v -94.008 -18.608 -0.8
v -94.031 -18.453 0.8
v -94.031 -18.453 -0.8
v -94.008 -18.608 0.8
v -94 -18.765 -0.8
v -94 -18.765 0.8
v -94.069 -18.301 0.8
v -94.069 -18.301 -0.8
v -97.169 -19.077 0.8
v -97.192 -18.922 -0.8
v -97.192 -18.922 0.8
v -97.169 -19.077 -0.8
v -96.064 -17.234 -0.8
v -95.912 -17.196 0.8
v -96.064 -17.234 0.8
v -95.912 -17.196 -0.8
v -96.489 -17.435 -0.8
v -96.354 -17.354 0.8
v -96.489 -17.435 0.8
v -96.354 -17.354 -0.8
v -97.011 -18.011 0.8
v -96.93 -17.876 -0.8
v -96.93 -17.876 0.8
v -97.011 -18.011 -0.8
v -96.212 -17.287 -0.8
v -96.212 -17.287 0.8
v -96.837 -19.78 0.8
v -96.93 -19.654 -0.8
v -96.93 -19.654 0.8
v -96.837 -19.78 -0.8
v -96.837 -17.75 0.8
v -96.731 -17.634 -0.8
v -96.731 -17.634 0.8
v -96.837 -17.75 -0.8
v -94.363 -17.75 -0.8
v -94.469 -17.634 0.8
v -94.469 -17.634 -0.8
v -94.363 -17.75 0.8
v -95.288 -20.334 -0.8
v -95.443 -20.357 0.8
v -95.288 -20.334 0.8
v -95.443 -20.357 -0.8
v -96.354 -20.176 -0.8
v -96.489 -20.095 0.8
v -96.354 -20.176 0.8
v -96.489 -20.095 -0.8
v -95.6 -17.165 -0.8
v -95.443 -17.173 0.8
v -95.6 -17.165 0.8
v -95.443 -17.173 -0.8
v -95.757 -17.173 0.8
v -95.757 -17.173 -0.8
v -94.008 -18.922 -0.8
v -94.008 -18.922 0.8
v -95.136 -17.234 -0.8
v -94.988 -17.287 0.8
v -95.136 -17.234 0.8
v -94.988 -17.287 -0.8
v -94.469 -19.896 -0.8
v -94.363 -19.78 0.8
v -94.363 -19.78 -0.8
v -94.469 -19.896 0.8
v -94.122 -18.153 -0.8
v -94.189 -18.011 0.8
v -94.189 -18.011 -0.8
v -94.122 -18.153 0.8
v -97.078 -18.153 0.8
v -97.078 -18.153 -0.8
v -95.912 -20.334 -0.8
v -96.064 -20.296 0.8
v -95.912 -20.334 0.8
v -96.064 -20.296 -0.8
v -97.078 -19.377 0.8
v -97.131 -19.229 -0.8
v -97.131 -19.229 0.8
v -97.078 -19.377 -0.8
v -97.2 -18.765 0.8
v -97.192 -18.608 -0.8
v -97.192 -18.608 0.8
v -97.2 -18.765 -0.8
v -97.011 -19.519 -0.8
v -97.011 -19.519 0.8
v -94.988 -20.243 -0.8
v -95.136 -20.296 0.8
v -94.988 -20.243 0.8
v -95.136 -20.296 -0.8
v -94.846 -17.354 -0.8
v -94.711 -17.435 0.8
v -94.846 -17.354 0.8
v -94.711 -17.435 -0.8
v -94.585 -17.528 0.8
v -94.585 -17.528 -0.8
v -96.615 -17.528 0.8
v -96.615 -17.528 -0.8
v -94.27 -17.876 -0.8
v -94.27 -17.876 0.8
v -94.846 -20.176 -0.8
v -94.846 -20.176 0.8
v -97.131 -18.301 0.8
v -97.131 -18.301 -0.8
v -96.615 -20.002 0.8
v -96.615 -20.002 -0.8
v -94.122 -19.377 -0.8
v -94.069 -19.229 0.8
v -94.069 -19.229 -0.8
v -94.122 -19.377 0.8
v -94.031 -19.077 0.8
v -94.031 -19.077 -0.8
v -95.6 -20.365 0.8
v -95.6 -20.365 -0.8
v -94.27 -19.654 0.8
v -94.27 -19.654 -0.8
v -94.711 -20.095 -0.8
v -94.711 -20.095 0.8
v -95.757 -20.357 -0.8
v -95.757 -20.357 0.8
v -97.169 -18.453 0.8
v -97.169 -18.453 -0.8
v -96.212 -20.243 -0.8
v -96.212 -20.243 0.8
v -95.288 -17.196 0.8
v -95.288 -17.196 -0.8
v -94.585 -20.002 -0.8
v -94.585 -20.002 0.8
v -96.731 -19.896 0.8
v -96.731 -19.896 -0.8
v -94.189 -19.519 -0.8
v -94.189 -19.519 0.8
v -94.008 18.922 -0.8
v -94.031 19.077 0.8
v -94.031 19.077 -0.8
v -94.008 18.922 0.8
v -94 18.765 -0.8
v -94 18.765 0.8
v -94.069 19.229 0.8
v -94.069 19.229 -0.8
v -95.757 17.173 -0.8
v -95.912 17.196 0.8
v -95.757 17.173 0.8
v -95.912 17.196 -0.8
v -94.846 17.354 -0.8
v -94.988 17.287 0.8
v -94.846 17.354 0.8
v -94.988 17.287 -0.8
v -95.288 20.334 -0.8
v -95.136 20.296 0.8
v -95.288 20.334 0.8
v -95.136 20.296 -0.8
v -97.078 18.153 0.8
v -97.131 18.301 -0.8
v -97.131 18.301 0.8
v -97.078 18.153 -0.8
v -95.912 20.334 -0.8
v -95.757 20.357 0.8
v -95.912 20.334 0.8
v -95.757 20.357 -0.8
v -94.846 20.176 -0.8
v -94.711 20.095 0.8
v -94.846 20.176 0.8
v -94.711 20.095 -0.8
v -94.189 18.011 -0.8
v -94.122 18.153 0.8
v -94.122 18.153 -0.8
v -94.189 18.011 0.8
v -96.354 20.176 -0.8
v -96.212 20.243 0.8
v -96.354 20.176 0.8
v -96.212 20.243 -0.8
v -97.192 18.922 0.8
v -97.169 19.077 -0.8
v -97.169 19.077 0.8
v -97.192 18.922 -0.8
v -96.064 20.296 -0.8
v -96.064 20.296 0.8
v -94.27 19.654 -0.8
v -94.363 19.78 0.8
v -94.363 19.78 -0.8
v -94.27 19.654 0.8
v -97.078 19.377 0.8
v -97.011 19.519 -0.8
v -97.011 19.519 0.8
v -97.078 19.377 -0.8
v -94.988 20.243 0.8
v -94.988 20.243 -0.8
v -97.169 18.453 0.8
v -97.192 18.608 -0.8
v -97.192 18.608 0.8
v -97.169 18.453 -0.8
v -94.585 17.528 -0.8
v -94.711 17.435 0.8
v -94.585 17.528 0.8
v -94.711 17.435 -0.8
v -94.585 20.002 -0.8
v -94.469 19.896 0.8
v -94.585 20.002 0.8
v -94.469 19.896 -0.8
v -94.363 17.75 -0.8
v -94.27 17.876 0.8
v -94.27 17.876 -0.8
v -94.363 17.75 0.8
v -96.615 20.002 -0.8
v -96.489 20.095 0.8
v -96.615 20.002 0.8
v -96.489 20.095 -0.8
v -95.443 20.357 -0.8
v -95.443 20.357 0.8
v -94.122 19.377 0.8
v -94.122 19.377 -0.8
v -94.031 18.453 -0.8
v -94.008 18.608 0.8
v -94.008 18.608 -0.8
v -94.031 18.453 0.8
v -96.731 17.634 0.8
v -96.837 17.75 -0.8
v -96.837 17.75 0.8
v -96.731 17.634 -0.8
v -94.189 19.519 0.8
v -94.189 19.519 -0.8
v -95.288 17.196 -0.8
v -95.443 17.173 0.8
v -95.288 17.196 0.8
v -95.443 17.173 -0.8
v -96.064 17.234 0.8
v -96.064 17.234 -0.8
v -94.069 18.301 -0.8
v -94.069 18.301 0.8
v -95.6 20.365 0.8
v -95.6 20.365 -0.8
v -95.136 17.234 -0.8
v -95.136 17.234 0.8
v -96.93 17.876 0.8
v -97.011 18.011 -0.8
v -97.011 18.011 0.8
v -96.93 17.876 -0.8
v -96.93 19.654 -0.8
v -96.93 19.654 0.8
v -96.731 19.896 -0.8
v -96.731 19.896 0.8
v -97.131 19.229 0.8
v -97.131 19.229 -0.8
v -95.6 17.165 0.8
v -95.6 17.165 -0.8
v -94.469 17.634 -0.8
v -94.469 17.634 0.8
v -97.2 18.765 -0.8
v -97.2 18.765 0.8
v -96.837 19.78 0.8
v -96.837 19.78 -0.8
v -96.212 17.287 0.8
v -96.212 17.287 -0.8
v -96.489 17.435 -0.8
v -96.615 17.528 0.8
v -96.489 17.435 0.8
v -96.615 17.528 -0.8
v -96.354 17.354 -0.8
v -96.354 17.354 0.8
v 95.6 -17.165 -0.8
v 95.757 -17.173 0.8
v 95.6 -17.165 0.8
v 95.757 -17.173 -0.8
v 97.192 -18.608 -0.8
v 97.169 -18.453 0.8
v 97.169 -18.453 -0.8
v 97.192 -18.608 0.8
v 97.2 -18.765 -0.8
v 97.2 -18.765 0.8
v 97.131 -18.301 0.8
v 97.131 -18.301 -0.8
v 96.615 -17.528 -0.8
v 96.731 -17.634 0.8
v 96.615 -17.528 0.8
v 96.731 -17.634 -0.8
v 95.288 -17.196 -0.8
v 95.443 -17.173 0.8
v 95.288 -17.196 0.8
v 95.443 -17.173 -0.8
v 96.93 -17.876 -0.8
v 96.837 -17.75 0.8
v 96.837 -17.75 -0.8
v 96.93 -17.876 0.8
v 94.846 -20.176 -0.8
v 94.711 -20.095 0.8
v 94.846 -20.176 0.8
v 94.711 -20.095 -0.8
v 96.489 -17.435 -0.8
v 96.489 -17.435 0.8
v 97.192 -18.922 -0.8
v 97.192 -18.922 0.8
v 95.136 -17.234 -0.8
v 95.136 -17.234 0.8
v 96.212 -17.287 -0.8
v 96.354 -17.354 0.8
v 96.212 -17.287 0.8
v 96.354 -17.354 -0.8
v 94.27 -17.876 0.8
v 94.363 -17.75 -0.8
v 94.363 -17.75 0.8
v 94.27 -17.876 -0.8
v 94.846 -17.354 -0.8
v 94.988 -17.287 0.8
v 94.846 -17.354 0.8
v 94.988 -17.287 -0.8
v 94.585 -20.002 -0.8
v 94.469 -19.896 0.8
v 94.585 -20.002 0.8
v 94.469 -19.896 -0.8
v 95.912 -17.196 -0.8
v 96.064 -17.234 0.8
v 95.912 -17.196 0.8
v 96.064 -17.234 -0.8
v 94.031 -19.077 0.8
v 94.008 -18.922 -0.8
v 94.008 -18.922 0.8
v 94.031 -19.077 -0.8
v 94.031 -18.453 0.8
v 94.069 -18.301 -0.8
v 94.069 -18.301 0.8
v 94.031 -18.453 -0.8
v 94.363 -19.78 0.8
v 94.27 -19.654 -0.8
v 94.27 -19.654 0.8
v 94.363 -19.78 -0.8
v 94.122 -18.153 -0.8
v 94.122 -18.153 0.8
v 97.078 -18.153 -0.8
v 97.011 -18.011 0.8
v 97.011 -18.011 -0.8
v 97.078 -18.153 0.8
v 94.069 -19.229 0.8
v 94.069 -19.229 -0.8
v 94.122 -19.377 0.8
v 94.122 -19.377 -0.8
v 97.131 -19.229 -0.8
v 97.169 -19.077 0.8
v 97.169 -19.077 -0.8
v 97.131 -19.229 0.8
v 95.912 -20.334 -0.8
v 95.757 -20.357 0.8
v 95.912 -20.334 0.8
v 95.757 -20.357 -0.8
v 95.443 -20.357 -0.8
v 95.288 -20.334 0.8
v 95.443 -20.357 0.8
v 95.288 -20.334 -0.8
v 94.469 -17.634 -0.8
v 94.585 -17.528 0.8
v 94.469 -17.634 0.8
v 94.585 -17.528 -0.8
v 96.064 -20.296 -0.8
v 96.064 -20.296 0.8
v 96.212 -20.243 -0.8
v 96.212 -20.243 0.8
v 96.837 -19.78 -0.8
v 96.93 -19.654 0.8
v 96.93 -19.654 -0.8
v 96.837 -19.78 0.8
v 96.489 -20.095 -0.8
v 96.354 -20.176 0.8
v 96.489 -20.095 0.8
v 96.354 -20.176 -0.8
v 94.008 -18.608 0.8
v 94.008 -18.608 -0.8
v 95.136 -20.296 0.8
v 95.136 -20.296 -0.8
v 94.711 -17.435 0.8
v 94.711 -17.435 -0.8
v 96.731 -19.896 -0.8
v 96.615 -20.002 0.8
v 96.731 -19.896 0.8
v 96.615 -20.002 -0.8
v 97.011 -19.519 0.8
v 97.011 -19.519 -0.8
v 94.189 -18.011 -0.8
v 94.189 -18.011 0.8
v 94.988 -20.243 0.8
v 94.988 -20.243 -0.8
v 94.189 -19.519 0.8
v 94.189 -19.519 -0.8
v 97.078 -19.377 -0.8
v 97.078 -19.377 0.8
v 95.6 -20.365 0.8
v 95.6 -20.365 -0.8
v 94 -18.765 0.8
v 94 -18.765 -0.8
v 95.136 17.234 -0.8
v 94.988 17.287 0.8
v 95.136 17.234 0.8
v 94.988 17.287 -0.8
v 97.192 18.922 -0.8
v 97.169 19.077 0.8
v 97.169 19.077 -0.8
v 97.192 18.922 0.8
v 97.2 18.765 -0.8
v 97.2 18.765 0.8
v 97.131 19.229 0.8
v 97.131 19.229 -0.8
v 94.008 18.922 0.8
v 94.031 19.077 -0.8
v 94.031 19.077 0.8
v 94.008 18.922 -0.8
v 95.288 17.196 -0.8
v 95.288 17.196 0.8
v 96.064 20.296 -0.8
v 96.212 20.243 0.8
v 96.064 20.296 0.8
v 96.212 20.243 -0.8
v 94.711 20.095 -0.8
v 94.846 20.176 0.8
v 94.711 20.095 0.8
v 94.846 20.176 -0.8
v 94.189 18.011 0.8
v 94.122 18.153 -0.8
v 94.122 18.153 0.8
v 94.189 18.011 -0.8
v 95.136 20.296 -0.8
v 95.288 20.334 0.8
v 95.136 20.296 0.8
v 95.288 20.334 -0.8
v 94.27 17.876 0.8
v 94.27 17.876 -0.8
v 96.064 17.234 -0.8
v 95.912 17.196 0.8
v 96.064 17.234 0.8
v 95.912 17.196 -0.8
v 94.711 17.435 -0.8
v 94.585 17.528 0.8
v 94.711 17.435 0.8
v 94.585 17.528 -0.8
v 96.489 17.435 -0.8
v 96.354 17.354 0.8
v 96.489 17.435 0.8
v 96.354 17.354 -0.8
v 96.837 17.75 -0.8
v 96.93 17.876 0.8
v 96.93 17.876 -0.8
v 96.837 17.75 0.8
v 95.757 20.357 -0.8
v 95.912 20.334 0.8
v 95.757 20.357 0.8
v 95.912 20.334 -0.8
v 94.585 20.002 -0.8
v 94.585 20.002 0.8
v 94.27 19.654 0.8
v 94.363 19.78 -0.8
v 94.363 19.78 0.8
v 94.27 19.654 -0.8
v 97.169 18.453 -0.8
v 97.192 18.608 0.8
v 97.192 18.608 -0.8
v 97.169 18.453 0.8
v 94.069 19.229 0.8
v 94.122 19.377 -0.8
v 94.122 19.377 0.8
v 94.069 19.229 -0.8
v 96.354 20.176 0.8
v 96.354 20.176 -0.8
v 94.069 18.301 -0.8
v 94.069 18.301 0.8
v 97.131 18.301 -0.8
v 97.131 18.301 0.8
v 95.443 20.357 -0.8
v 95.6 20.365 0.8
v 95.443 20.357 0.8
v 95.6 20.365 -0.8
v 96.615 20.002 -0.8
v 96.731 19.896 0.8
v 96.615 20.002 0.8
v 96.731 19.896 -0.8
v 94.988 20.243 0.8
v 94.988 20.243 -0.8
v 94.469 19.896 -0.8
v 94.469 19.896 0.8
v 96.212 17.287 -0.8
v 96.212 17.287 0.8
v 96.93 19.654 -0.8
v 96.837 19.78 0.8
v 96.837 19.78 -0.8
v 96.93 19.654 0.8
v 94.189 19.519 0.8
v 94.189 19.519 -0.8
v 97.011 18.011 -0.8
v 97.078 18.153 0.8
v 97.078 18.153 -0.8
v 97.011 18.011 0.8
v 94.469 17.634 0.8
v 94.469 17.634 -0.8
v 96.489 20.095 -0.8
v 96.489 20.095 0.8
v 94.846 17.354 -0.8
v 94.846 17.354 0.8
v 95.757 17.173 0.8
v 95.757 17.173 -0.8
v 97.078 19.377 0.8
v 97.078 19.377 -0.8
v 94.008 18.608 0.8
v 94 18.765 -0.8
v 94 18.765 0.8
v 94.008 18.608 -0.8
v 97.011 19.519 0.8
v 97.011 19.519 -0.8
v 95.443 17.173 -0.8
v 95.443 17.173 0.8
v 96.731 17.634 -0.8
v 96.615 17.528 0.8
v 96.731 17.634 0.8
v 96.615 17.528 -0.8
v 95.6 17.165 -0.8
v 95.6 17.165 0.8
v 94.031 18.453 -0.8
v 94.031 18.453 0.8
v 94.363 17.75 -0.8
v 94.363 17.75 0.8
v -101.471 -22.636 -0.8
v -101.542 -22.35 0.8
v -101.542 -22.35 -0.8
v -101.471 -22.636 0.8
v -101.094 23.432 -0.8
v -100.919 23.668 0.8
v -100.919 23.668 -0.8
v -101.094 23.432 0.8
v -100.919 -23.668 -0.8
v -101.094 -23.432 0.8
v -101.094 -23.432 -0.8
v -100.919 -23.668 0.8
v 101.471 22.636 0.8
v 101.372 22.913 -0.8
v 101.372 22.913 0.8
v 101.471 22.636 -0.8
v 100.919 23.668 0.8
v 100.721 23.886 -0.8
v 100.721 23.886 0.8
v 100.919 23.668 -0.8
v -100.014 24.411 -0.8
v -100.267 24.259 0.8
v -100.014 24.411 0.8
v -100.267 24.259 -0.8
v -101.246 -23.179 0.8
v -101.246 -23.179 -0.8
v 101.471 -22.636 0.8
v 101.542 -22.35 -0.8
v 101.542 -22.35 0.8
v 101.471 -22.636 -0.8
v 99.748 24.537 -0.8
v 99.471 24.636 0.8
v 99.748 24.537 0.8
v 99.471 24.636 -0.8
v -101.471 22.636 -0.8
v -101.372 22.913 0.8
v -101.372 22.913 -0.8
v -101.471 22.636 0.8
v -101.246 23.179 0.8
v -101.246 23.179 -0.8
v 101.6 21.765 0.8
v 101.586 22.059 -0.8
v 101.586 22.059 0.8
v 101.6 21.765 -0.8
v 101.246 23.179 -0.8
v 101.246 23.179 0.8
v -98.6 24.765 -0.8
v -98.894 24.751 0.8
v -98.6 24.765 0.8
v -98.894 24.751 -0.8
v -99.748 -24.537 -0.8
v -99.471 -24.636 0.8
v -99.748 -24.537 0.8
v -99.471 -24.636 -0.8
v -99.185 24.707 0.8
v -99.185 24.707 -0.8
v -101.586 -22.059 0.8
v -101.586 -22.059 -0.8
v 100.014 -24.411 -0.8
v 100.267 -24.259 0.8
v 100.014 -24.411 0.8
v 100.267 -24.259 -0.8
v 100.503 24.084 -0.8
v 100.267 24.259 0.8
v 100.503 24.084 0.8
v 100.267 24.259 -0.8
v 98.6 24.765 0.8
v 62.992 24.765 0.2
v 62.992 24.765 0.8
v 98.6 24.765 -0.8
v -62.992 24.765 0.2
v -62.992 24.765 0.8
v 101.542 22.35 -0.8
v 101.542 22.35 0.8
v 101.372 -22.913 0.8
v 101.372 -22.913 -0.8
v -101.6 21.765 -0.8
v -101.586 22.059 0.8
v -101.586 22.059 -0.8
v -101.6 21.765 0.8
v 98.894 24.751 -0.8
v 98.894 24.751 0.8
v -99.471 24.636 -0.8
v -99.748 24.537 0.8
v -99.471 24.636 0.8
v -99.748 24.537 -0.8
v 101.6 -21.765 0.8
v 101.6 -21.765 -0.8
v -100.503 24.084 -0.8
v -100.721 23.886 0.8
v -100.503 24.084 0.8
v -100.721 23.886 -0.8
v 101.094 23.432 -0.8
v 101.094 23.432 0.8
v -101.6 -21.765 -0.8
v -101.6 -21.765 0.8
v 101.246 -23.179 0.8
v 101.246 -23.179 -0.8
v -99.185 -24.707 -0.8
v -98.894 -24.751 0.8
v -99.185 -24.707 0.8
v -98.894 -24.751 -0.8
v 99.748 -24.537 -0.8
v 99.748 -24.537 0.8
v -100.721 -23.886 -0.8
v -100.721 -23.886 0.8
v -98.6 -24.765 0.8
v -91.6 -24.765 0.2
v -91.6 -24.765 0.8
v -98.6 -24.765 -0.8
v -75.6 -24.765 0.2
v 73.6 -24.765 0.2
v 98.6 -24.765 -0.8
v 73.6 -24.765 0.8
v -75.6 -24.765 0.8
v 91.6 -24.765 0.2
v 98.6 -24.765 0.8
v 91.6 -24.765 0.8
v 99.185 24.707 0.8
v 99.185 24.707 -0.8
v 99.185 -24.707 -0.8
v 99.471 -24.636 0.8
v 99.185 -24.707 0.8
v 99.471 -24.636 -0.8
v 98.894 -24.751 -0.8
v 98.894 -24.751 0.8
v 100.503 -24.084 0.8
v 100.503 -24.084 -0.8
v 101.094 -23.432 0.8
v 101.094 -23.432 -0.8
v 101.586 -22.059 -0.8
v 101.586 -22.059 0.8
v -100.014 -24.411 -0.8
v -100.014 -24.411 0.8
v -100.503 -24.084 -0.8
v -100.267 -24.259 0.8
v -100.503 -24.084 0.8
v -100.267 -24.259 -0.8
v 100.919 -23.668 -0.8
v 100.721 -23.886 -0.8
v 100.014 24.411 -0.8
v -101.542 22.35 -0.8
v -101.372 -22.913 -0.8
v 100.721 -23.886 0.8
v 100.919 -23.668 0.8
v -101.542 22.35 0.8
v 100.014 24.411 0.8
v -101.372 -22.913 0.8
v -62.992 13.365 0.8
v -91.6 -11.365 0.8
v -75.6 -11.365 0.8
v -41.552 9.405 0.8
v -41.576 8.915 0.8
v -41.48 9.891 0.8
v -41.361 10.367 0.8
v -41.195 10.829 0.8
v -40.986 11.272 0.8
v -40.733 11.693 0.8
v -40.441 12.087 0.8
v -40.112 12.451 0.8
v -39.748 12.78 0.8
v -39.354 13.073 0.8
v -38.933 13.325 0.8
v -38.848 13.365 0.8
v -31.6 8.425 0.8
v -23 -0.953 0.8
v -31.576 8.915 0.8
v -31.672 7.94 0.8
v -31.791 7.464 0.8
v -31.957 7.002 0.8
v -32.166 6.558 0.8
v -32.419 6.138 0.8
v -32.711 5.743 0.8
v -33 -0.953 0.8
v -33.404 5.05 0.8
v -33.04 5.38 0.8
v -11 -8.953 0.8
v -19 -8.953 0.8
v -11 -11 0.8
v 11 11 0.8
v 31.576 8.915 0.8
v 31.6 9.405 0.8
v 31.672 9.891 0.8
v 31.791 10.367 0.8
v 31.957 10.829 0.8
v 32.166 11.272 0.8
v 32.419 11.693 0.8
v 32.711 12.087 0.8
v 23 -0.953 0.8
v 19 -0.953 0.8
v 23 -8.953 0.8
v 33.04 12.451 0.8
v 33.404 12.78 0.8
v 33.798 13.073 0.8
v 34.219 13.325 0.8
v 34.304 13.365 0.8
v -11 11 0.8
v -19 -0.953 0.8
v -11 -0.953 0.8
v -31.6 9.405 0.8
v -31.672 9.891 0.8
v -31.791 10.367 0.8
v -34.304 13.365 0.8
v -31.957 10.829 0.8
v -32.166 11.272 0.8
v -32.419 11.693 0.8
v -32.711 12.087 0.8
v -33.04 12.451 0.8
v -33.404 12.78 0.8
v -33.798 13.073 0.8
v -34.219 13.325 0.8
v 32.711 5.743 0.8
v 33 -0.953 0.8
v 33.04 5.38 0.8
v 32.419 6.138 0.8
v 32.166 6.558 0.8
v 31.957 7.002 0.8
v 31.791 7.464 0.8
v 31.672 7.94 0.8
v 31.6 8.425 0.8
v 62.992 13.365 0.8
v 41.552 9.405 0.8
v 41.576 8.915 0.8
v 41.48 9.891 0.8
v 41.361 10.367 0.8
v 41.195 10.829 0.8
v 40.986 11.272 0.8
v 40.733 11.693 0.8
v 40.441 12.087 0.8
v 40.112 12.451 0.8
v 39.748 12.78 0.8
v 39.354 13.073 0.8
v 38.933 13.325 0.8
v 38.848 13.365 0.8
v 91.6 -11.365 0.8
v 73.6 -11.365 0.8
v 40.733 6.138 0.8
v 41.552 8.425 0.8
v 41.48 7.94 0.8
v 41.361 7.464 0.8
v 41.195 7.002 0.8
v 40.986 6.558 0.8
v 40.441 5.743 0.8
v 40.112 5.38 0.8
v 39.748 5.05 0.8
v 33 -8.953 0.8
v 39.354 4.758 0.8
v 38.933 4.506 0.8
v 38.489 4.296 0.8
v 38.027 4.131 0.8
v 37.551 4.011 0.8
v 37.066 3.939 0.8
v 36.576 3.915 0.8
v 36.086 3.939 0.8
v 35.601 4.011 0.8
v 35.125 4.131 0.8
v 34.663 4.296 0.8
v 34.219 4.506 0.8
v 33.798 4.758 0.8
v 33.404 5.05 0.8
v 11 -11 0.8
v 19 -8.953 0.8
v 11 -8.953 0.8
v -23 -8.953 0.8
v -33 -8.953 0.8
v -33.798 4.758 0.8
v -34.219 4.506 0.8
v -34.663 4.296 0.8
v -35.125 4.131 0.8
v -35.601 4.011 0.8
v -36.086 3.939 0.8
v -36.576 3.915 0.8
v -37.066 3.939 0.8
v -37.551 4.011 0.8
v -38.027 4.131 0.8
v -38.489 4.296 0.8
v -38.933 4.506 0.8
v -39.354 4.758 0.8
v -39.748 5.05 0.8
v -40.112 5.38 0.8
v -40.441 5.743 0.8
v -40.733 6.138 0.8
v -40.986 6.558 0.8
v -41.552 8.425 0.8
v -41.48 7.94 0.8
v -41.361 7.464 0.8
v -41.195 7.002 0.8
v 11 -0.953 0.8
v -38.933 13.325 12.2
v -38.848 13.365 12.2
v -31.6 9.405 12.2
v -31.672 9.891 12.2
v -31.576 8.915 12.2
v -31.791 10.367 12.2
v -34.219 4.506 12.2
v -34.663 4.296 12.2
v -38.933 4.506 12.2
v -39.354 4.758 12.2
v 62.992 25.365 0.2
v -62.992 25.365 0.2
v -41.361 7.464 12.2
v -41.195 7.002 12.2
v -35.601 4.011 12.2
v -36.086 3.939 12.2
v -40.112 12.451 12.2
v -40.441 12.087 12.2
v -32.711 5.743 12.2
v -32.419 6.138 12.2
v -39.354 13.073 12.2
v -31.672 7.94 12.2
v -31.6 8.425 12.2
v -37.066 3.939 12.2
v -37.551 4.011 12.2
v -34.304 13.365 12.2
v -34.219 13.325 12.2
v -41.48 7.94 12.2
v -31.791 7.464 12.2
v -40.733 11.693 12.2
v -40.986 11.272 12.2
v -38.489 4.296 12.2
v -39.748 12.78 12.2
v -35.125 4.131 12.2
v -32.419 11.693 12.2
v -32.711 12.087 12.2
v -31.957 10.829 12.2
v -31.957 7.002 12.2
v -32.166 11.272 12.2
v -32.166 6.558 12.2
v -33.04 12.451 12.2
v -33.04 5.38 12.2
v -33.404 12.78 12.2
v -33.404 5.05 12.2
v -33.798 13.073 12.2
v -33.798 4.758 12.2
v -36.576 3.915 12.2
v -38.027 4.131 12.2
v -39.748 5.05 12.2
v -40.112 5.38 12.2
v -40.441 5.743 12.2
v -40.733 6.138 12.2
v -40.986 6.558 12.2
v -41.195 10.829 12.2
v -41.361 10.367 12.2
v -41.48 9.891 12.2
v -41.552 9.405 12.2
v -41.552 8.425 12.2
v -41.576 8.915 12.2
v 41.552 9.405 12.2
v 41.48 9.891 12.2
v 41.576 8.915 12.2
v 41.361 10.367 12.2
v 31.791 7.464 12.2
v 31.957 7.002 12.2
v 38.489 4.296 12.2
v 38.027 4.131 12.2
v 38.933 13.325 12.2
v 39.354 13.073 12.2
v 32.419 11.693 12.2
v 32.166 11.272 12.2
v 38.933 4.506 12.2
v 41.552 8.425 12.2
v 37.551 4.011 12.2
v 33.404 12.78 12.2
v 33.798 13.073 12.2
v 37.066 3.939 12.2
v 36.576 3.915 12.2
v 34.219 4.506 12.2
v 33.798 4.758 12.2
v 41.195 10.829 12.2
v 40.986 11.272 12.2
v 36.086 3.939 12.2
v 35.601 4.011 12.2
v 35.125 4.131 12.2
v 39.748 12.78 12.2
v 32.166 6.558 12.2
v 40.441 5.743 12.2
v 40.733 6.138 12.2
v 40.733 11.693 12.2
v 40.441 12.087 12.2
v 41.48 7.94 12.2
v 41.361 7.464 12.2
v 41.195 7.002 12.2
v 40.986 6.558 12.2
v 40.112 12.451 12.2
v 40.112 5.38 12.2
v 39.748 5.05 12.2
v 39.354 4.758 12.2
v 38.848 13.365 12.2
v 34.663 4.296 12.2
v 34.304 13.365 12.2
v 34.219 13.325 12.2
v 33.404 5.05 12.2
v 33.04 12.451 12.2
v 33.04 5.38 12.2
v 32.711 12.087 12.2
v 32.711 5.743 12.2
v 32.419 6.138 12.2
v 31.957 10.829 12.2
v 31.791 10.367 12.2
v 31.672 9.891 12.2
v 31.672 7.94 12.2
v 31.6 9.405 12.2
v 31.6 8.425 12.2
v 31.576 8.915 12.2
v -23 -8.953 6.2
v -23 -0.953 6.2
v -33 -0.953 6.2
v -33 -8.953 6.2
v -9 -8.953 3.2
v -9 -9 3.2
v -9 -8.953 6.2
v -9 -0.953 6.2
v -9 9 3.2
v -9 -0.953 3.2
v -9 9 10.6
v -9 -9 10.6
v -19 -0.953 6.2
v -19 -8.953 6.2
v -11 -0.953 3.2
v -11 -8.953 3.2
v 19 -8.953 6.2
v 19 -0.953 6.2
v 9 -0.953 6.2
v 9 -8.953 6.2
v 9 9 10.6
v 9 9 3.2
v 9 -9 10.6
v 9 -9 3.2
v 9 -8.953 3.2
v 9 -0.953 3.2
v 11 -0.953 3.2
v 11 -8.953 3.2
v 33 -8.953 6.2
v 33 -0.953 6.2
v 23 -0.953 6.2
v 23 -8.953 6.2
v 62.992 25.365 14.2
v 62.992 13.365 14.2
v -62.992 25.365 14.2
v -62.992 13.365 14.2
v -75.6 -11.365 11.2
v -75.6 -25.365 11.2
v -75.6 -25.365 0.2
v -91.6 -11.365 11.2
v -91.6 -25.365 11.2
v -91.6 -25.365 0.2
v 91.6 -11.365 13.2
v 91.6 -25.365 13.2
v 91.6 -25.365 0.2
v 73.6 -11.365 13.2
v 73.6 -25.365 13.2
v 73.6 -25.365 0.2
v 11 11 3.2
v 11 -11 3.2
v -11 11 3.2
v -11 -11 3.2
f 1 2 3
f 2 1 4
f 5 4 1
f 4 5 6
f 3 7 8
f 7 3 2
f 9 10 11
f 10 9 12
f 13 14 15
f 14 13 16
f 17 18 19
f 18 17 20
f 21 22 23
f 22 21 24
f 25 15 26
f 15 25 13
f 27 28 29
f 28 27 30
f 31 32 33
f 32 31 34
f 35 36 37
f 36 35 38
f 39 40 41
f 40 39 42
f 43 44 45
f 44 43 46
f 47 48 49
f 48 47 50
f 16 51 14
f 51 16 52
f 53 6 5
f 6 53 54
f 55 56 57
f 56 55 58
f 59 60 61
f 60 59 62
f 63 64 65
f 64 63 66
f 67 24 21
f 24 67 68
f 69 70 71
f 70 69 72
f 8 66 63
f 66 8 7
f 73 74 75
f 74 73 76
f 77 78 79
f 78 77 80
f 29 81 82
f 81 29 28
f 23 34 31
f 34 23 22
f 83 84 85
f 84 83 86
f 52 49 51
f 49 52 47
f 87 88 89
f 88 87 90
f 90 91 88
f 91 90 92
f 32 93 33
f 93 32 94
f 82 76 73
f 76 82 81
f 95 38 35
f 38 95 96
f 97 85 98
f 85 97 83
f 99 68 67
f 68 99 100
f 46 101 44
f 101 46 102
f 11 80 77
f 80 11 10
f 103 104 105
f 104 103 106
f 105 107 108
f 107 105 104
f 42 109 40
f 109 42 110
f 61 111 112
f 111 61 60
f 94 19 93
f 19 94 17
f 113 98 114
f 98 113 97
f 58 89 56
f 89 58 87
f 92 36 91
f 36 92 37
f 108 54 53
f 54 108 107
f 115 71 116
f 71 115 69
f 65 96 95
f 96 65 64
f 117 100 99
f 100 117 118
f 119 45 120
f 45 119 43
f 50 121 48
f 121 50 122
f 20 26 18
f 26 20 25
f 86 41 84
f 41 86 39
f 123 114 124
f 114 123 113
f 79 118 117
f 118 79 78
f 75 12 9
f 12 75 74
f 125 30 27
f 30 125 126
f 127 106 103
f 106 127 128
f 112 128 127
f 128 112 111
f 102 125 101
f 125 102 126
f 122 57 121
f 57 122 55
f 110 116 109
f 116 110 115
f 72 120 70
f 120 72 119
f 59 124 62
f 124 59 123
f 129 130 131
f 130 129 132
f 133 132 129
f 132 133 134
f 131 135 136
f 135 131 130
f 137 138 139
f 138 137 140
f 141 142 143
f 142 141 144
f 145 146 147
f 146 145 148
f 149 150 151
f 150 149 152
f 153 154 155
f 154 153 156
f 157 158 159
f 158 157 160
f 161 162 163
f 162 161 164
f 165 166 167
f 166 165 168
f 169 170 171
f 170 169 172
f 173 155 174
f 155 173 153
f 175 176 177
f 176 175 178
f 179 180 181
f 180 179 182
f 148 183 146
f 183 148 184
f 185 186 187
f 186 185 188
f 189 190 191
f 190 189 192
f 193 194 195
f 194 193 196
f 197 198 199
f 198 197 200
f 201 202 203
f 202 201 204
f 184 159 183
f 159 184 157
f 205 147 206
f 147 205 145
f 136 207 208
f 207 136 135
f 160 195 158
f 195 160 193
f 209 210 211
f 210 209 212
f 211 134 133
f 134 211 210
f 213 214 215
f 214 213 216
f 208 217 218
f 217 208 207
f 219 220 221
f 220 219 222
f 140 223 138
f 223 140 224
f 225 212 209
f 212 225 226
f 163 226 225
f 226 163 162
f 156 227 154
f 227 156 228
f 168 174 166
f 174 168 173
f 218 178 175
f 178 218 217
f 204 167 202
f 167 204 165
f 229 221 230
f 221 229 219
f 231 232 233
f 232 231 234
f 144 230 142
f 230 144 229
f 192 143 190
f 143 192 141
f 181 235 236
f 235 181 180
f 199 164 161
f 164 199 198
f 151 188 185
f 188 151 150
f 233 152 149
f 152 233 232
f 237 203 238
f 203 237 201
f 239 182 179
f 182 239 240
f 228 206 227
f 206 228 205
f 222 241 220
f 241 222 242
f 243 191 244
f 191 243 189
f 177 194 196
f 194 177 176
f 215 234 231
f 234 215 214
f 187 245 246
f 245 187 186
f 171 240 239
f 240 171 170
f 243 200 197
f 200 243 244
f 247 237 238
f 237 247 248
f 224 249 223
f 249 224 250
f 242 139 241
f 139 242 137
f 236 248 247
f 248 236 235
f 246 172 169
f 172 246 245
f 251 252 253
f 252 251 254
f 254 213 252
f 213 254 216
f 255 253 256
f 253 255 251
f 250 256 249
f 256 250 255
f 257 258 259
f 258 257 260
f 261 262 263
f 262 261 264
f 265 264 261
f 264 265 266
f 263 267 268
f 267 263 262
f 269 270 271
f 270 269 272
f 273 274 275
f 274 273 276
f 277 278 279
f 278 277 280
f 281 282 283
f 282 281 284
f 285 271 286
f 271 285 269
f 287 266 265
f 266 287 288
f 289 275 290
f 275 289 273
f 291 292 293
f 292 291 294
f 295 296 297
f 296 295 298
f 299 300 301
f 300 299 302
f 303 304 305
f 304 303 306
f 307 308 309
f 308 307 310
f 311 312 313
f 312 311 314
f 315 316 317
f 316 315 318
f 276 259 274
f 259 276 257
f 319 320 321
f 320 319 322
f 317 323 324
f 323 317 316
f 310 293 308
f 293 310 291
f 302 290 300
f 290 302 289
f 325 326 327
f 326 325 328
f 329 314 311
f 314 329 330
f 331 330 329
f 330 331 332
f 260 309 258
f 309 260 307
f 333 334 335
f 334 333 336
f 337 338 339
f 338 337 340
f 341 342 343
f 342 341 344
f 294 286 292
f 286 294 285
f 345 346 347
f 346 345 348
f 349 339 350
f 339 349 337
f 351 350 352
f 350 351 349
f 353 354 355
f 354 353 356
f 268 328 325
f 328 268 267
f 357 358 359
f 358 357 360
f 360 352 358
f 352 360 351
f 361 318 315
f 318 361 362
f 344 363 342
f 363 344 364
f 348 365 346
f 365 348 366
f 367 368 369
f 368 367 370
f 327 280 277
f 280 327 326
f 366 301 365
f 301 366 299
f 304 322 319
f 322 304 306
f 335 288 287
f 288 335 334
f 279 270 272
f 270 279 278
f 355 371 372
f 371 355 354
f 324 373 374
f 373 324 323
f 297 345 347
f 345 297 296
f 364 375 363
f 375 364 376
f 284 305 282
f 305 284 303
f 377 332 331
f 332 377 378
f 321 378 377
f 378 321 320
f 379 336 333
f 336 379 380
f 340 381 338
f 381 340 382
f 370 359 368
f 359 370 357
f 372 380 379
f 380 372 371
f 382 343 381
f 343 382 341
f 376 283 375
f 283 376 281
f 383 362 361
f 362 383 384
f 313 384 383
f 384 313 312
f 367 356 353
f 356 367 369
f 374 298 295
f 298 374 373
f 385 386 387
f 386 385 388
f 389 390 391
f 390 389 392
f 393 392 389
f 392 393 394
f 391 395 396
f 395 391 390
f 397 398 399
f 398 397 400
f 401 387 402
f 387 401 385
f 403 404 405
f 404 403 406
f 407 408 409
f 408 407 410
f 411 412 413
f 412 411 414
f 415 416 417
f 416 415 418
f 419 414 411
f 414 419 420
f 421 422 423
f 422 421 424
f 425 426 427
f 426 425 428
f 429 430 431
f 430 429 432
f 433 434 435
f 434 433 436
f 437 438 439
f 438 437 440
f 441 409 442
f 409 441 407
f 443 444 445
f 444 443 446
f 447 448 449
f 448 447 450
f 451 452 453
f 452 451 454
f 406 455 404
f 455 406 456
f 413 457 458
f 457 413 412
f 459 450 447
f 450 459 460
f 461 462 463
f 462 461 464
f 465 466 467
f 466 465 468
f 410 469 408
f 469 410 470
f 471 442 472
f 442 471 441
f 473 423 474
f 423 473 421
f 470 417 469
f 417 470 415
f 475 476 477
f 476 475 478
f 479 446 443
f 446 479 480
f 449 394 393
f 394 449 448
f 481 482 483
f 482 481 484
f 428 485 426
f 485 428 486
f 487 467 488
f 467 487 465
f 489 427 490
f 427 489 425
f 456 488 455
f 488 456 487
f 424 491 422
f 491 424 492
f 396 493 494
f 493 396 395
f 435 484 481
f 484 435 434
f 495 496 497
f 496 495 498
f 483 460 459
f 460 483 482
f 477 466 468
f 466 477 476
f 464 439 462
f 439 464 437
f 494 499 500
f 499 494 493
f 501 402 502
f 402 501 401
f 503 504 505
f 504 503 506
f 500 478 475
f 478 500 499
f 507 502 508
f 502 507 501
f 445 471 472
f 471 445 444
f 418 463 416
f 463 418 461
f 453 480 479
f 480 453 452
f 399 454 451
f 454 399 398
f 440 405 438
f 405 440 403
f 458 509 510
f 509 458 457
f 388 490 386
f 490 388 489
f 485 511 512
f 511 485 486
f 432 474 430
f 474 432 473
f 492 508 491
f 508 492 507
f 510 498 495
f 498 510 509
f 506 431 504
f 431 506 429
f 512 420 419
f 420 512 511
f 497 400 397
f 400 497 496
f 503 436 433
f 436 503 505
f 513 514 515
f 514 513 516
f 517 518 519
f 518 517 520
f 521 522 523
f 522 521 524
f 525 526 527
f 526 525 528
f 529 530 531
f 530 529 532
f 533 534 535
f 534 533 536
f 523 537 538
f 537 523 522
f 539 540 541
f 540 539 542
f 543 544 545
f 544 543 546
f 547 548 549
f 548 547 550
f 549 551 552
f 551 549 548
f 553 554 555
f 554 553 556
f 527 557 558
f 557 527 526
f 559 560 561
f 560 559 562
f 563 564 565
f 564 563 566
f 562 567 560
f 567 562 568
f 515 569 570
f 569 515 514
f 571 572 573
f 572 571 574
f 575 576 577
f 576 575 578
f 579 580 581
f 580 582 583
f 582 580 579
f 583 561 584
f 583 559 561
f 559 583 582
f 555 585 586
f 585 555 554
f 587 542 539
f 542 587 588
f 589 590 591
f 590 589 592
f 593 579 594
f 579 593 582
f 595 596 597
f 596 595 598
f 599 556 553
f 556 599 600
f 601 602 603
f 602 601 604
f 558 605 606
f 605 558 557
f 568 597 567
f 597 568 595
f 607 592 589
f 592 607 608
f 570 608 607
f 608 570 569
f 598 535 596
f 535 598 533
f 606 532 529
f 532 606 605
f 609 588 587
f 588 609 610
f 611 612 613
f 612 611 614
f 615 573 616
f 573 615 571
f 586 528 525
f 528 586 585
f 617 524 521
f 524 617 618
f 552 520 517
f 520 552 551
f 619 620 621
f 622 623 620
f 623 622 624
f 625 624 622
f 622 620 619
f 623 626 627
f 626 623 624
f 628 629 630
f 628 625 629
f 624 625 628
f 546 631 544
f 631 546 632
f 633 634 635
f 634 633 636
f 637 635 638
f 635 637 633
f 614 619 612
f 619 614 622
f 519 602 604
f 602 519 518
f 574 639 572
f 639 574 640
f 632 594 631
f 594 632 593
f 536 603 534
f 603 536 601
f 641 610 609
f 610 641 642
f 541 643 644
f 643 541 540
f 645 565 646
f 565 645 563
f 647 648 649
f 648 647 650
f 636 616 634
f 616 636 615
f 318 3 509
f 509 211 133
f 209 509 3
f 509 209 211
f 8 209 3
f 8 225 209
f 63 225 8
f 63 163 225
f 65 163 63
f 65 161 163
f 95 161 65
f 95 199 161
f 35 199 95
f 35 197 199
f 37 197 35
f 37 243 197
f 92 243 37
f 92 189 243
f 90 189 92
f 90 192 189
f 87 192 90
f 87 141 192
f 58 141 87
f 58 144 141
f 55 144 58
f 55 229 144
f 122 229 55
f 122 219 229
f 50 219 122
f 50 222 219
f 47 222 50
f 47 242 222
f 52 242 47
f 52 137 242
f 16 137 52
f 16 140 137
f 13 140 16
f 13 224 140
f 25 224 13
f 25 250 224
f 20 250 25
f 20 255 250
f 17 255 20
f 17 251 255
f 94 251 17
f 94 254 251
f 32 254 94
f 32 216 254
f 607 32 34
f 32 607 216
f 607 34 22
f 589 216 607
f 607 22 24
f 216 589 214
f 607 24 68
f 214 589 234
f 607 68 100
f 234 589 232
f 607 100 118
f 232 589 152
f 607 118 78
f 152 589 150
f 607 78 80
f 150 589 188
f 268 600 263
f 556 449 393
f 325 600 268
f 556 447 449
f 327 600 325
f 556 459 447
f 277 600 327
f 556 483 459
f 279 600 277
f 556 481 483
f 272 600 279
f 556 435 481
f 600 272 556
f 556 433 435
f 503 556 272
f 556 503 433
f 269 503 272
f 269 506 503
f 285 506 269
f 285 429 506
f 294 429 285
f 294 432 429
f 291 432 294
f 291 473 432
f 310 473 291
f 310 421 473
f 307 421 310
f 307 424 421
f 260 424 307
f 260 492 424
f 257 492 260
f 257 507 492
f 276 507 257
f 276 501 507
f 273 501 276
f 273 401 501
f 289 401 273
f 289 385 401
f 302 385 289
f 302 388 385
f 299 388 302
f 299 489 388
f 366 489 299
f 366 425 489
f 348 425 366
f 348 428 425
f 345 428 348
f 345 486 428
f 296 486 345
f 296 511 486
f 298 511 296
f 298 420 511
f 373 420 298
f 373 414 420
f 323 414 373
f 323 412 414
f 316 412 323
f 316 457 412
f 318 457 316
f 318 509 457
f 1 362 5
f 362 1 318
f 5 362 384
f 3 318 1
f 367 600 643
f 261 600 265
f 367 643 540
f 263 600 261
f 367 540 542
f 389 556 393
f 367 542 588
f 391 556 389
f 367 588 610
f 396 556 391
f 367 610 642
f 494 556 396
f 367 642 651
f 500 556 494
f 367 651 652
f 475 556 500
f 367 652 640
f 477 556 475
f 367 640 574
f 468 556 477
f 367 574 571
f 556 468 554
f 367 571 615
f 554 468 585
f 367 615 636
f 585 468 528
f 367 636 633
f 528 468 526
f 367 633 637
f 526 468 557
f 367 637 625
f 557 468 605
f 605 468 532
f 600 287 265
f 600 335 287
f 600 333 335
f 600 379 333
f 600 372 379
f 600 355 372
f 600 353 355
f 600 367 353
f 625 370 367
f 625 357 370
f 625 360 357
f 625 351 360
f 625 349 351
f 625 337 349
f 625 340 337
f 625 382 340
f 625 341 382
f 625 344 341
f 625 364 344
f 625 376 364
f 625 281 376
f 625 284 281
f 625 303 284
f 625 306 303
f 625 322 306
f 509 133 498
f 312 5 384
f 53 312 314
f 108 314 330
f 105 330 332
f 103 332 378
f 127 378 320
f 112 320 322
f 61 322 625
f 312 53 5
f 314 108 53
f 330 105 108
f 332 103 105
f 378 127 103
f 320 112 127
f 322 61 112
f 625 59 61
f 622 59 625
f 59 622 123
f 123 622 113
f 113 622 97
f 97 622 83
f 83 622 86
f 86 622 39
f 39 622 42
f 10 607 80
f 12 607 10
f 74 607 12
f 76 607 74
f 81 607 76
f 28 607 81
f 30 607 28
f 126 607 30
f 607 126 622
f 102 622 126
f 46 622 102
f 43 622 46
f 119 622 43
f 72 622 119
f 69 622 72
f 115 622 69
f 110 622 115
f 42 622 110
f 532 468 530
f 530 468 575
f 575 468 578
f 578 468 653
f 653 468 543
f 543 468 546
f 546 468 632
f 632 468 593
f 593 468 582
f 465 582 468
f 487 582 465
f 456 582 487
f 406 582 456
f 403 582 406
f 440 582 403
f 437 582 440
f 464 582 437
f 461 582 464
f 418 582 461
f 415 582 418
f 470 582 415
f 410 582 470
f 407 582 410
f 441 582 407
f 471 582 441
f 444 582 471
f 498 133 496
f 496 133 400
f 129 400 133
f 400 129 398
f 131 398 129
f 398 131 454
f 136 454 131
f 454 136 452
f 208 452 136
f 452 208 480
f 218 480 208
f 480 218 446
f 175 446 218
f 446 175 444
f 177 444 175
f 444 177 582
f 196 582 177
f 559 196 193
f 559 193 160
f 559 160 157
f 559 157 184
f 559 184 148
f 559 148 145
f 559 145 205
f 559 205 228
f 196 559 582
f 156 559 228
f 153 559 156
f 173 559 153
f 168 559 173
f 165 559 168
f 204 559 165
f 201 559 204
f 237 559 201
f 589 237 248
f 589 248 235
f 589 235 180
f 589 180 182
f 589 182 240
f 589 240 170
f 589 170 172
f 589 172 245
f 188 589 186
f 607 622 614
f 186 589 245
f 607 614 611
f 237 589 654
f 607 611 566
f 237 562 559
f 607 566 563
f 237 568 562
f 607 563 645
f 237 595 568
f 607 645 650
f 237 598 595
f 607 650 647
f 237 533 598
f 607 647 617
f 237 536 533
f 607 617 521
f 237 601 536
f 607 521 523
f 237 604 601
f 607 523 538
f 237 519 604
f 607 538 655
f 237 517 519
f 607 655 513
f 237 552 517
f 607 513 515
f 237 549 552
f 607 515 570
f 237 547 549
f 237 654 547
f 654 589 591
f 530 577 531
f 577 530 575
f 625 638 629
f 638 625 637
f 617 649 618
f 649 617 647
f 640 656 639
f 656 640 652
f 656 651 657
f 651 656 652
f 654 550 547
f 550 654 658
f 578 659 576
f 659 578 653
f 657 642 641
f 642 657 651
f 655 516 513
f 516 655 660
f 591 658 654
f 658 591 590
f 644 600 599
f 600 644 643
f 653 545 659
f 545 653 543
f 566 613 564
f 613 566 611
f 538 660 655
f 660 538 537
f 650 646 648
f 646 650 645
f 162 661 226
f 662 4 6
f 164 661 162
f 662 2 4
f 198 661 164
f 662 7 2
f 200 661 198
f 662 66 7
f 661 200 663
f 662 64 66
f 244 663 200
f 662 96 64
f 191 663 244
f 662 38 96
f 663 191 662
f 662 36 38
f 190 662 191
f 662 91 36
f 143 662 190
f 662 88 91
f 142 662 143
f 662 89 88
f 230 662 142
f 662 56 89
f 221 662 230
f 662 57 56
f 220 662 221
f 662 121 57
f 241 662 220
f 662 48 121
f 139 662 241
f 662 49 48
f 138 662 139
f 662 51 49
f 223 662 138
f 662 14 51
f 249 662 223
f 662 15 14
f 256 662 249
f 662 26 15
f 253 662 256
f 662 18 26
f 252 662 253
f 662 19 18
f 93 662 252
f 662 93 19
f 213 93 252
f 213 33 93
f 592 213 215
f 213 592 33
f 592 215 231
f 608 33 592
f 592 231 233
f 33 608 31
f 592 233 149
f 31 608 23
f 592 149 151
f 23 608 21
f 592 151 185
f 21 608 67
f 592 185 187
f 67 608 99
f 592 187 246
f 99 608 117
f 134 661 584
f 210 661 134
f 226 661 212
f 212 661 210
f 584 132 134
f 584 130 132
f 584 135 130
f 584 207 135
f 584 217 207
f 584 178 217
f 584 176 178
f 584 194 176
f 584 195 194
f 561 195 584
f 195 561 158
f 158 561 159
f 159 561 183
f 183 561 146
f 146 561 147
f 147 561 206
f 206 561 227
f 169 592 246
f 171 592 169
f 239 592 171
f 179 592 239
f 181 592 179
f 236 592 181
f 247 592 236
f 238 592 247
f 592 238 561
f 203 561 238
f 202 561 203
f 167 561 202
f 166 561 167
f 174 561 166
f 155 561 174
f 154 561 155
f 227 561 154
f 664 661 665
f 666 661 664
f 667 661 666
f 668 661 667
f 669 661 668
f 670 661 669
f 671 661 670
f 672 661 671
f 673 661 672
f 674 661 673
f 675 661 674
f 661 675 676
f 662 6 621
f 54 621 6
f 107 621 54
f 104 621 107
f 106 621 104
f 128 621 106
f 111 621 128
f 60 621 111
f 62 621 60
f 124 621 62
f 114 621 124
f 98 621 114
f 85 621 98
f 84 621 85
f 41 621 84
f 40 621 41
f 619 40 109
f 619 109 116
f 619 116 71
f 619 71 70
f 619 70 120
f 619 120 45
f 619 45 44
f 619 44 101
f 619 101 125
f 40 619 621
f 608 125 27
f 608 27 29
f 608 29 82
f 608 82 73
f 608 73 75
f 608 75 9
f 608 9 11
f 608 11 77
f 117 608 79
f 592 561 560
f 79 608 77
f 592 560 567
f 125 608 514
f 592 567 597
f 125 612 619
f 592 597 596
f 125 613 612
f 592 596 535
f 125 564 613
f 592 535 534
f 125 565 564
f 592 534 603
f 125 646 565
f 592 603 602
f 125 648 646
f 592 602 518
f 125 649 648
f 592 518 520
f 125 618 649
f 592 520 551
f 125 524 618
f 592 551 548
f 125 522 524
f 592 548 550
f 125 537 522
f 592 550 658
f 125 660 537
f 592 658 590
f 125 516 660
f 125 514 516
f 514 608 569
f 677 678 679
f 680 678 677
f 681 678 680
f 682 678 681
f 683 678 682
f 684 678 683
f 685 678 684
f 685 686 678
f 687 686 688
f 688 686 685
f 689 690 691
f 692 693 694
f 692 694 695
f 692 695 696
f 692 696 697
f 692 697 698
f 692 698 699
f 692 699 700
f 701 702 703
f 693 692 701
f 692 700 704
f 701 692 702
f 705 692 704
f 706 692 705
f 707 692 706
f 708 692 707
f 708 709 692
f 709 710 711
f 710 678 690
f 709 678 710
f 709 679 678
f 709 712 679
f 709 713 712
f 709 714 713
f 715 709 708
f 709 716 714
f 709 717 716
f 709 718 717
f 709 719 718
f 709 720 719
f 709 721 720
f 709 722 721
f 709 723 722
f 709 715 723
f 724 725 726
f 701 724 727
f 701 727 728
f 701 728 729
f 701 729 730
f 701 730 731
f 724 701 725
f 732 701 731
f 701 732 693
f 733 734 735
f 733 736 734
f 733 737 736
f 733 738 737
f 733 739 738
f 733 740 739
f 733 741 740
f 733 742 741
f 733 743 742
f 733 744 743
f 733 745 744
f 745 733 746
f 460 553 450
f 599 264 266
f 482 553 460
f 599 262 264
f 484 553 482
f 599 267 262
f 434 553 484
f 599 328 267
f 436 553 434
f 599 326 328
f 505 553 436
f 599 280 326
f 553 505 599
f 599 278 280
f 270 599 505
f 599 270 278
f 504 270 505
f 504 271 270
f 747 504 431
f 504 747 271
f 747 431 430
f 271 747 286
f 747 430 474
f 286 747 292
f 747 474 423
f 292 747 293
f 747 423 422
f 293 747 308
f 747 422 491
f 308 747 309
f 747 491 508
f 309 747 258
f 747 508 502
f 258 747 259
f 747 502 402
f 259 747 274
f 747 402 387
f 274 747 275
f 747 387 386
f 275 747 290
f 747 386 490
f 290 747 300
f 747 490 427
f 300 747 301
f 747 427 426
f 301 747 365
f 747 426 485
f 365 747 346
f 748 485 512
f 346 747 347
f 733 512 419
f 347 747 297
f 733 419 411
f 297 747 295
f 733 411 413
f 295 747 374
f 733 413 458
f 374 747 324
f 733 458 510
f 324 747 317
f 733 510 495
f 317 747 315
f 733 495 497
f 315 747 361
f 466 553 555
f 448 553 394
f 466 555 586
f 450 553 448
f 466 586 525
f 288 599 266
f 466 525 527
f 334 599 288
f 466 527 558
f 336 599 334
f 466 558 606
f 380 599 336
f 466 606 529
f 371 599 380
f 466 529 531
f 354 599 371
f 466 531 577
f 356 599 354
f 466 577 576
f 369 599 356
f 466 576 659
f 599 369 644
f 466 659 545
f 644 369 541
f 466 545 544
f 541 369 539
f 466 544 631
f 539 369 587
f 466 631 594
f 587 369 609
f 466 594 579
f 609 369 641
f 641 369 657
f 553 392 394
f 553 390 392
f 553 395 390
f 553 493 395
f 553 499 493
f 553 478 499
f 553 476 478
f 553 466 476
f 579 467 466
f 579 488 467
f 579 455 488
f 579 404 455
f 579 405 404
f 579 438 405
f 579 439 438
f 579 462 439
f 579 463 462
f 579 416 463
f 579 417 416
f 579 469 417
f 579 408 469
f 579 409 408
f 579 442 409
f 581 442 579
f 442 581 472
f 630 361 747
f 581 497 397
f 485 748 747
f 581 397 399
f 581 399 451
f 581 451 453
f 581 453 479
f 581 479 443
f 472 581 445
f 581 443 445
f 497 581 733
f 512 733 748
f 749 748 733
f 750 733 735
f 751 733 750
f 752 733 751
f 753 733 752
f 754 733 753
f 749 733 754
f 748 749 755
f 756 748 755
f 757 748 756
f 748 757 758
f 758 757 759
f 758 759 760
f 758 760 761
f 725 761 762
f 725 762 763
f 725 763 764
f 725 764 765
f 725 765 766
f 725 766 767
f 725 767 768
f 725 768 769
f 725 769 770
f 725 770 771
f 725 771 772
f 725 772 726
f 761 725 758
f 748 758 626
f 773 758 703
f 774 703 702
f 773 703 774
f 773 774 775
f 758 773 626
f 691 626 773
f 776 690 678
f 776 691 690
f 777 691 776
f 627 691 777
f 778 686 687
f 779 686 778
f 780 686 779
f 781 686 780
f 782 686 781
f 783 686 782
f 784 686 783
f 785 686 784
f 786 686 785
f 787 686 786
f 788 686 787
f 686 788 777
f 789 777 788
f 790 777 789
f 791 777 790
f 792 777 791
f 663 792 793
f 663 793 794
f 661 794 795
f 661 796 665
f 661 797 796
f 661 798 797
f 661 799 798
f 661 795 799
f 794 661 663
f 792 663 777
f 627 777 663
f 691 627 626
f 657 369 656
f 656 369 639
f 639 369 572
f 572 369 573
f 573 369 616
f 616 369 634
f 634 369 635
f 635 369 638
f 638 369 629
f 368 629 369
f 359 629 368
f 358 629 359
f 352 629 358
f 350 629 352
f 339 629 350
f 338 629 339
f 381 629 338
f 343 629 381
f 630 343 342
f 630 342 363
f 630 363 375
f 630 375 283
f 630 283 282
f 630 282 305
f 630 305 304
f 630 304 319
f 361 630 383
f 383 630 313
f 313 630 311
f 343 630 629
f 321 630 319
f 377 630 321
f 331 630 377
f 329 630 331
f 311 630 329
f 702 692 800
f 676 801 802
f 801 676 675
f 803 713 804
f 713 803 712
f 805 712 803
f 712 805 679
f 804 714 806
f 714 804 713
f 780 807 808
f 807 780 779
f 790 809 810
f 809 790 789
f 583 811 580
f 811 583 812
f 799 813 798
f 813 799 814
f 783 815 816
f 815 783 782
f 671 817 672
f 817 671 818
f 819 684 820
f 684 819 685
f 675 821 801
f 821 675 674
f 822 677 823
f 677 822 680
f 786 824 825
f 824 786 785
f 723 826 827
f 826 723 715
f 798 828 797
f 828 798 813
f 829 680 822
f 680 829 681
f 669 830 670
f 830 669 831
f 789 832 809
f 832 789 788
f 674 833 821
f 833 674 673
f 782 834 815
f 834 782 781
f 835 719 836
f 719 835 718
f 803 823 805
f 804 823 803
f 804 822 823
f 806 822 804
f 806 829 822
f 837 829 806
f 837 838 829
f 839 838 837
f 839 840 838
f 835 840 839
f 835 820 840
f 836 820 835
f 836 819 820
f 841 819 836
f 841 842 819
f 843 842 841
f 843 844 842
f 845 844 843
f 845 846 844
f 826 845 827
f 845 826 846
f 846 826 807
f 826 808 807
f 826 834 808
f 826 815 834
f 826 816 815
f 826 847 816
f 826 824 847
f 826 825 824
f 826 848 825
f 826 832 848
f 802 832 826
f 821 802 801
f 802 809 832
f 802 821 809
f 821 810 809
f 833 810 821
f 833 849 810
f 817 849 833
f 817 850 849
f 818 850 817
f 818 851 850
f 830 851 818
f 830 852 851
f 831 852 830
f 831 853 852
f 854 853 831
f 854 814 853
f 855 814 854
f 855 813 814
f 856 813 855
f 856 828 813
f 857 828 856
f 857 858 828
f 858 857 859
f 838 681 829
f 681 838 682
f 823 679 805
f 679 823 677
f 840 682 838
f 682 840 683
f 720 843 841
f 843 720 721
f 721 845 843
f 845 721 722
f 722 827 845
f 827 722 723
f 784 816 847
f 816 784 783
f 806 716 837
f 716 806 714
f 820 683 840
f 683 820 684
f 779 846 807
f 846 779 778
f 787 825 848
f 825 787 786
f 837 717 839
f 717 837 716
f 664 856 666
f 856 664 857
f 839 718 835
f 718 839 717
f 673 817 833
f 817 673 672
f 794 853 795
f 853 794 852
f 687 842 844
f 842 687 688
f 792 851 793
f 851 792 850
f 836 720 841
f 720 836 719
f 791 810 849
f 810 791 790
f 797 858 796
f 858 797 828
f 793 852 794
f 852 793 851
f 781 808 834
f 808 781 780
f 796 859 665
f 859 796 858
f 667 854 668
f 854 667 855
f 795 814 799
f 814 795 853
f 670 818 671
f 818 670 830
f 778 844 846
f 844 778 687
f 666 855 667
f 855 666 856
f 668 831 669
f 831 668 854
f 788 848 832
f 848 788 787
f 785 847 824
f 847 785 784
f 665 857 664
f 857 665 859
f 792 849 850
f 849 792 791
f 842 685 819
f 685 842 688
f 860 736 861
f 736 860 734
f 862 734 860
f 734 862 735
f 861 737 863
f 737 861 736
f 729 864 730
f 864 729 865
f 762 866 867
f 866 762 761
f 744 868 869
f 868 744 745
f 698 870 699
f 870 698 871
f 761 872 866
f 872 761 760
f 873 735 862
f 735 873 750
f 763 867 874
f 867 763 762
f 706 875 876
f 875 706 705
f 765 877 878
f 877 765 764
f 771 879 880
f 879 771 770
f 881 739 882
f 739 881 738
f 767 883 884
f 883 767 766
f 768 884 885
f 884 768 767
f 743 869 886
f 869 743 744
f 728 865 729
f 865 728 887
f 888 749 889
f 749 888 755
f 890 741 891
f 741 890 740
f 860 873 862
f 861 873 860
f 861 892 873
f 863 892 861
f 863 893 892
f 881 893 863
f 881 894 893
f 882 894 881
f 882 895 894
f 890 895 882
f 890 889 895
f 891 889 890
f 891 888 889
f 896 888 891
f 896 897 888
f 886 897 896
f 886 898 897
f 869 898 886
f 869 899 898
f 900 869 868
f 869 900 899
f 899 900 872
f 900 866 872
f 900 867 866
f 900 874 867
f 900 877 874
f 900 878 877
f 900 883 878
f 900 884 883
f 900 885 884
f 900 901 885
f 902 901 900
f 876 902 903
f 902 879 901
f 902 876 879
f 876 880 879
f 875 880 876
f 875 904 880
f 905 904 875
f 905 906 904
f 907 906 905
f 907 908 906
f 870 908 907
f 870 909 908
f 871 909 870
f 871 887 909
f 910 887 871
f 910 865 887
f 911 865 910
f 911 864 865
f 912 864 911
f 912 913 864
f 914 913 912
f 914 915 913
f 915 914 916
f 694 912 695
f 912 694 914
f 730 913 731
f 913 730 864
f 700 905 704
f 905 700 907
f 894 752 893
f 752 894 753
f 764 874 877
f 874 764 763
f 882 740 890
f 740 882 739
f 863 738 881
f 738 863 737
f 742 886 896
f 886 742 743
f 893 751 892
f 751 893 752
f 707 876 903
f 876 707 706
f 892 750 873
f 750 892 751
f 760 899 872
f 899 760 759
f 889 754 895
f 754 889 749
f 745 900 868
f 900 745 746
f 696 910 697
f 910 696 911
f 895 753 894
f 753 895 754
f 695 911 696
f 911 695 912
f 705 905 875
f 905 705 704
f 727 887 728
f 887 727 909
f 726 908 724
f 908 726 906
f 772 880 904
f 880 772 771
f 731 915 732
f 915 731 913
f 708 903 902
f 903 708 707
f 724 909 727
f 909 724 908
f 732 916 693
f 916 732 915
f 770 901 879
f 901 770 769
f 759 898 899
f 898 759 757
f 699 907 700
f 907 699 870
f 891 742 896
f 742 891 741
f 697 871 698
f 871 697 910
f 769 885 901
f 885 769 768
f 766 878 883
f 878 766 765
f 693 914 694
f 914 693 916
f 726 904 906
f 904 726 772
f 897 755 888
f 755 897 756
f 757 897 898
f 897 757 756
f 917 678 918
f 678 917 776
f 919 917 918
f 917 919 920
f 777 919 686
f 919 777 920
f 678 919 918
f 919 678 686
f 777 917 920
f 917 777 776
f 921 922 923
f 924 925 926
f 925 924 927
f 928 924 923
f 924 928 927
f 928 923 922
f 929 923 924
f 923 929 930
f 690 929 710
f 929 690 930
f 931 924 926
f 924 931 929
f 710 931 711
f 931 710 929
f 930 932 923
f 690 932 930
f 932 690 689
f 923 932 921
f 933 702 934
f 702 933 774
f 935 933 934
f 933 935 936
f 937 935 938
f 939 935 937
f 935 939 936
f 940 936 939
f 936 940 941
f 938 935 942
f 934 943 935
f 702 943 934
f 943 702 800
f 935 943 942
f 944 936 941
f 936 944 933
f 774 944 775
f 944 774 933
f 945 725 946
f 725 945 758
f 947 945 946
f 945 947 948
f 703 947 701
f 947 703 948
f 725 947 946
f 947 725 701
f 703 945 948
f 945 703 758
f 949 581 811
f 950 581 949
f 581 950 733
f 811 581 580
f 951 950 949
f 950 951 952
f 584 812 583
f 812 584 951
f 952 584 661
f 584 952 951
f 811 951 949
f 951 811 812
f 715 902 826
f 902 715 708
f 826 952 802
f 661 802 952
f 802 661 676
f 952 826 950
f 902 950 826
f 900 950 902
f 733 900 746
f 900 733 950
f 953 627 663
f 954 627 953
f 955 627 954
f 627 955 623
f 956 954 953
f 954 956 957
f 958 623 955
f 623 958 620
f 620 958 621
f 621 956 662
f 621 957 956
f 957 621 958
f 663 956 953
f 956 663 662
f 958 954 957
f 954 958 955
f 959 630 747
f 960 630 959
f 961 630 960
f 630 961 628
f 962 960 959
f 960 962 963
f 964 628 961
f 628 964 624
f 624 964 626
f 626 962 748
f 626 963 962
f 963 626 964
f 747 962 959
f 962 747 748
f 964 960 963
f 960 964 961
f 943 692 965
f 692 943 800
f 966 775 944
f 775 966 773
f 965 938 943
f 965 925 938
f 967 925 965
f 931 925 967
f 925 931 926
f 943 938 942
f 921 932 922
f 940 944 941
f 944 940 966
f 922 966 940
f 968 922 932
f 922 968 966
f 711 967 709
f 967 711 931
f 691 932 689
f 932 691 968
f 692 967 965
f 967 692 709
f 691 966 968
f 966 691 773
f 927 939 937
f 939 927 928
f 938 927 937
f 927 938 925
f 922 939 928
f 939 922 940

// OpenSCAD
$fn = 64;

// --- Parameters (mm) ---
pcb_length = 203.2;
pcb_width  = 49.53;
pcb_thickness = 1.6;

corner_radius = 3.0;

mount_hole_diameter = 3.2;
mount_hole_edge_offset_x = 6.0;
mount_hole_edge_offset_y = 6.0;

overlap = 0.6;          // small intentional overlap to guarantee connectivity
eps = 0.01;

// --- Helper: rounded rectangle prism (single solid) ---
module rounded_rect_prism(L, W, H, R, center=true) {
    // 2D rounded rectangle via hull of circles, then linear_extrude
    module rr2d() {
        hull() {
            for (sx = [-1, 1], sy = [-1, 1])
                translate([sx*(L/2 - R), sy*(W/2 - R)])
                    circle(r=R);
        }
    }

    if (center)
        translate([0,0,-H/2])
            linear_extrude(height=H) rr2d();
    else
        linear_extrude(height=H) rr2d();
}

// --- PCB body with holes (connected solid) ---
module pcb_with_holes() {
    difference() {
        color([0.0, 0.4, 0.2])
            rounded_rect_prism(pcb_length, pcb_width, pcb_thickness, corner_radius, center=true);

        // mounting holes
        for (sx = [-1, 1], sy = [-1, 1]) {
            translate([sx*(pcb_length/2 - mount_hole_edge_offset_x),
                       sy*(pcb_width/2  - mount_hole_edge_offset_y),
                       0])
                cylinder(h=pcb_thickness + 2*overlap, r=mount_hole_diameter/2, center=true);
        }
    }
}

// --- Simple 3D components (all connected to PCB with calculated Z placement) ---
module components() {
    z_top = pcb_thickness/2;

    // Long terminal block along one long edge
    term_L = pcb_length * 0.62;
    term_W = 12.0;
    term_H = 14.0;
    translate([0,
               pcb_width/2 - term_W/2 + overlap,                 // overlap into PCB edge
               z_top + term_H/2 - overlap])                      // overlap into PCB top
        color([0.15,0.15,0.15])
            cube([term_L, term_W, term_H], center=true);

    // USB-like connector near left end
    usb_L = 16.0;
    usb_W = 14.0;
    usb_H = 11.0;
    translate([-(pcb_length/2 - usb_L/2 - 10.0),
               -(pcb_width/2 - usb_W/2) - overlap,               // overlap into PCB edge
               z_top + usb_H/2 - overlap])
        color([0.7,0.7,0.7])
            cube([usb_L, usb_W, usb_H], center=true);

    // Power jack near right end
    jack_L = 18.0;
    jack_W = 14.0;
    jack_H = 13.0;
    translate([ (pcb_length/2 - jack_L/2 - 10.0),
               -(pcb_width/2 - jack_W/2) - overlap,              // overlap into PCB edge
               z_top + jack_H/2 - overlap])
        color([0.1,0.1,0.1])
            cube([jack_L, jack_W, jack_H], center=true);

    // Main MCU/driver package (center)
    ic_L = 22.0;
    ic_W = 22.0;
    ic_H = 3.0;
    translate([0, 0, z_top + ic_H/2 - overlap])
        color([0.05,0.05,0.05])
            cube([ic_L, ic_W, ic_H], center=true);

    // Heatsink block on top of IC
    hs_L = 18.0;
    hs_W = 18.0;
    hs_H = 8.0;
    translate([0, 0, z_top + ic_H - overlap + hs_H/2 - overlap])
        color([0.25,0.25,0.25])
            cube([hs_L, hs_W, hs_H], center=true);

    // Two electrolytic capacitors
    cap_r = 5.0;
    cap_h = 12.0;
    cap_x = pcb_length*0.18;
    cap_y = pcb_width*0.18;
    for (sx = [-1, 1]) {
        translate([sx*cap_x, cap_y, z_top + cap_h/2 - overlap])
            color([0.0,0.0,0.0])
                cylinder(r=cap_r, h=cap_h, center=true);
    }

    // Small stepper-driver headers (row of low blocks)
    hdr_count = 5;
    hdr_pitch = 14.0;
    hdr_L = 10.0;
    hdr_W = 8.0;
    hdr_H = 6.0;
    hdr_y = -(pcb_width*0.10);
    for (i = [0:hdr_count-1]) {
        x = (i - (hdr_count-1)/2) * hdr_pitch;
        translate([x, hdr_y, z_top + hdr_H/2 - overlap])
            color([0.2,0.2,0.2])
                cube([hdr_L, hdr_W, hdr_H], center=true);
    }
}

// --- Complete model: ONE connected solid (union of touching/overlapping parts) ---
union() {
    pcb_with_holes();
    components();
}
